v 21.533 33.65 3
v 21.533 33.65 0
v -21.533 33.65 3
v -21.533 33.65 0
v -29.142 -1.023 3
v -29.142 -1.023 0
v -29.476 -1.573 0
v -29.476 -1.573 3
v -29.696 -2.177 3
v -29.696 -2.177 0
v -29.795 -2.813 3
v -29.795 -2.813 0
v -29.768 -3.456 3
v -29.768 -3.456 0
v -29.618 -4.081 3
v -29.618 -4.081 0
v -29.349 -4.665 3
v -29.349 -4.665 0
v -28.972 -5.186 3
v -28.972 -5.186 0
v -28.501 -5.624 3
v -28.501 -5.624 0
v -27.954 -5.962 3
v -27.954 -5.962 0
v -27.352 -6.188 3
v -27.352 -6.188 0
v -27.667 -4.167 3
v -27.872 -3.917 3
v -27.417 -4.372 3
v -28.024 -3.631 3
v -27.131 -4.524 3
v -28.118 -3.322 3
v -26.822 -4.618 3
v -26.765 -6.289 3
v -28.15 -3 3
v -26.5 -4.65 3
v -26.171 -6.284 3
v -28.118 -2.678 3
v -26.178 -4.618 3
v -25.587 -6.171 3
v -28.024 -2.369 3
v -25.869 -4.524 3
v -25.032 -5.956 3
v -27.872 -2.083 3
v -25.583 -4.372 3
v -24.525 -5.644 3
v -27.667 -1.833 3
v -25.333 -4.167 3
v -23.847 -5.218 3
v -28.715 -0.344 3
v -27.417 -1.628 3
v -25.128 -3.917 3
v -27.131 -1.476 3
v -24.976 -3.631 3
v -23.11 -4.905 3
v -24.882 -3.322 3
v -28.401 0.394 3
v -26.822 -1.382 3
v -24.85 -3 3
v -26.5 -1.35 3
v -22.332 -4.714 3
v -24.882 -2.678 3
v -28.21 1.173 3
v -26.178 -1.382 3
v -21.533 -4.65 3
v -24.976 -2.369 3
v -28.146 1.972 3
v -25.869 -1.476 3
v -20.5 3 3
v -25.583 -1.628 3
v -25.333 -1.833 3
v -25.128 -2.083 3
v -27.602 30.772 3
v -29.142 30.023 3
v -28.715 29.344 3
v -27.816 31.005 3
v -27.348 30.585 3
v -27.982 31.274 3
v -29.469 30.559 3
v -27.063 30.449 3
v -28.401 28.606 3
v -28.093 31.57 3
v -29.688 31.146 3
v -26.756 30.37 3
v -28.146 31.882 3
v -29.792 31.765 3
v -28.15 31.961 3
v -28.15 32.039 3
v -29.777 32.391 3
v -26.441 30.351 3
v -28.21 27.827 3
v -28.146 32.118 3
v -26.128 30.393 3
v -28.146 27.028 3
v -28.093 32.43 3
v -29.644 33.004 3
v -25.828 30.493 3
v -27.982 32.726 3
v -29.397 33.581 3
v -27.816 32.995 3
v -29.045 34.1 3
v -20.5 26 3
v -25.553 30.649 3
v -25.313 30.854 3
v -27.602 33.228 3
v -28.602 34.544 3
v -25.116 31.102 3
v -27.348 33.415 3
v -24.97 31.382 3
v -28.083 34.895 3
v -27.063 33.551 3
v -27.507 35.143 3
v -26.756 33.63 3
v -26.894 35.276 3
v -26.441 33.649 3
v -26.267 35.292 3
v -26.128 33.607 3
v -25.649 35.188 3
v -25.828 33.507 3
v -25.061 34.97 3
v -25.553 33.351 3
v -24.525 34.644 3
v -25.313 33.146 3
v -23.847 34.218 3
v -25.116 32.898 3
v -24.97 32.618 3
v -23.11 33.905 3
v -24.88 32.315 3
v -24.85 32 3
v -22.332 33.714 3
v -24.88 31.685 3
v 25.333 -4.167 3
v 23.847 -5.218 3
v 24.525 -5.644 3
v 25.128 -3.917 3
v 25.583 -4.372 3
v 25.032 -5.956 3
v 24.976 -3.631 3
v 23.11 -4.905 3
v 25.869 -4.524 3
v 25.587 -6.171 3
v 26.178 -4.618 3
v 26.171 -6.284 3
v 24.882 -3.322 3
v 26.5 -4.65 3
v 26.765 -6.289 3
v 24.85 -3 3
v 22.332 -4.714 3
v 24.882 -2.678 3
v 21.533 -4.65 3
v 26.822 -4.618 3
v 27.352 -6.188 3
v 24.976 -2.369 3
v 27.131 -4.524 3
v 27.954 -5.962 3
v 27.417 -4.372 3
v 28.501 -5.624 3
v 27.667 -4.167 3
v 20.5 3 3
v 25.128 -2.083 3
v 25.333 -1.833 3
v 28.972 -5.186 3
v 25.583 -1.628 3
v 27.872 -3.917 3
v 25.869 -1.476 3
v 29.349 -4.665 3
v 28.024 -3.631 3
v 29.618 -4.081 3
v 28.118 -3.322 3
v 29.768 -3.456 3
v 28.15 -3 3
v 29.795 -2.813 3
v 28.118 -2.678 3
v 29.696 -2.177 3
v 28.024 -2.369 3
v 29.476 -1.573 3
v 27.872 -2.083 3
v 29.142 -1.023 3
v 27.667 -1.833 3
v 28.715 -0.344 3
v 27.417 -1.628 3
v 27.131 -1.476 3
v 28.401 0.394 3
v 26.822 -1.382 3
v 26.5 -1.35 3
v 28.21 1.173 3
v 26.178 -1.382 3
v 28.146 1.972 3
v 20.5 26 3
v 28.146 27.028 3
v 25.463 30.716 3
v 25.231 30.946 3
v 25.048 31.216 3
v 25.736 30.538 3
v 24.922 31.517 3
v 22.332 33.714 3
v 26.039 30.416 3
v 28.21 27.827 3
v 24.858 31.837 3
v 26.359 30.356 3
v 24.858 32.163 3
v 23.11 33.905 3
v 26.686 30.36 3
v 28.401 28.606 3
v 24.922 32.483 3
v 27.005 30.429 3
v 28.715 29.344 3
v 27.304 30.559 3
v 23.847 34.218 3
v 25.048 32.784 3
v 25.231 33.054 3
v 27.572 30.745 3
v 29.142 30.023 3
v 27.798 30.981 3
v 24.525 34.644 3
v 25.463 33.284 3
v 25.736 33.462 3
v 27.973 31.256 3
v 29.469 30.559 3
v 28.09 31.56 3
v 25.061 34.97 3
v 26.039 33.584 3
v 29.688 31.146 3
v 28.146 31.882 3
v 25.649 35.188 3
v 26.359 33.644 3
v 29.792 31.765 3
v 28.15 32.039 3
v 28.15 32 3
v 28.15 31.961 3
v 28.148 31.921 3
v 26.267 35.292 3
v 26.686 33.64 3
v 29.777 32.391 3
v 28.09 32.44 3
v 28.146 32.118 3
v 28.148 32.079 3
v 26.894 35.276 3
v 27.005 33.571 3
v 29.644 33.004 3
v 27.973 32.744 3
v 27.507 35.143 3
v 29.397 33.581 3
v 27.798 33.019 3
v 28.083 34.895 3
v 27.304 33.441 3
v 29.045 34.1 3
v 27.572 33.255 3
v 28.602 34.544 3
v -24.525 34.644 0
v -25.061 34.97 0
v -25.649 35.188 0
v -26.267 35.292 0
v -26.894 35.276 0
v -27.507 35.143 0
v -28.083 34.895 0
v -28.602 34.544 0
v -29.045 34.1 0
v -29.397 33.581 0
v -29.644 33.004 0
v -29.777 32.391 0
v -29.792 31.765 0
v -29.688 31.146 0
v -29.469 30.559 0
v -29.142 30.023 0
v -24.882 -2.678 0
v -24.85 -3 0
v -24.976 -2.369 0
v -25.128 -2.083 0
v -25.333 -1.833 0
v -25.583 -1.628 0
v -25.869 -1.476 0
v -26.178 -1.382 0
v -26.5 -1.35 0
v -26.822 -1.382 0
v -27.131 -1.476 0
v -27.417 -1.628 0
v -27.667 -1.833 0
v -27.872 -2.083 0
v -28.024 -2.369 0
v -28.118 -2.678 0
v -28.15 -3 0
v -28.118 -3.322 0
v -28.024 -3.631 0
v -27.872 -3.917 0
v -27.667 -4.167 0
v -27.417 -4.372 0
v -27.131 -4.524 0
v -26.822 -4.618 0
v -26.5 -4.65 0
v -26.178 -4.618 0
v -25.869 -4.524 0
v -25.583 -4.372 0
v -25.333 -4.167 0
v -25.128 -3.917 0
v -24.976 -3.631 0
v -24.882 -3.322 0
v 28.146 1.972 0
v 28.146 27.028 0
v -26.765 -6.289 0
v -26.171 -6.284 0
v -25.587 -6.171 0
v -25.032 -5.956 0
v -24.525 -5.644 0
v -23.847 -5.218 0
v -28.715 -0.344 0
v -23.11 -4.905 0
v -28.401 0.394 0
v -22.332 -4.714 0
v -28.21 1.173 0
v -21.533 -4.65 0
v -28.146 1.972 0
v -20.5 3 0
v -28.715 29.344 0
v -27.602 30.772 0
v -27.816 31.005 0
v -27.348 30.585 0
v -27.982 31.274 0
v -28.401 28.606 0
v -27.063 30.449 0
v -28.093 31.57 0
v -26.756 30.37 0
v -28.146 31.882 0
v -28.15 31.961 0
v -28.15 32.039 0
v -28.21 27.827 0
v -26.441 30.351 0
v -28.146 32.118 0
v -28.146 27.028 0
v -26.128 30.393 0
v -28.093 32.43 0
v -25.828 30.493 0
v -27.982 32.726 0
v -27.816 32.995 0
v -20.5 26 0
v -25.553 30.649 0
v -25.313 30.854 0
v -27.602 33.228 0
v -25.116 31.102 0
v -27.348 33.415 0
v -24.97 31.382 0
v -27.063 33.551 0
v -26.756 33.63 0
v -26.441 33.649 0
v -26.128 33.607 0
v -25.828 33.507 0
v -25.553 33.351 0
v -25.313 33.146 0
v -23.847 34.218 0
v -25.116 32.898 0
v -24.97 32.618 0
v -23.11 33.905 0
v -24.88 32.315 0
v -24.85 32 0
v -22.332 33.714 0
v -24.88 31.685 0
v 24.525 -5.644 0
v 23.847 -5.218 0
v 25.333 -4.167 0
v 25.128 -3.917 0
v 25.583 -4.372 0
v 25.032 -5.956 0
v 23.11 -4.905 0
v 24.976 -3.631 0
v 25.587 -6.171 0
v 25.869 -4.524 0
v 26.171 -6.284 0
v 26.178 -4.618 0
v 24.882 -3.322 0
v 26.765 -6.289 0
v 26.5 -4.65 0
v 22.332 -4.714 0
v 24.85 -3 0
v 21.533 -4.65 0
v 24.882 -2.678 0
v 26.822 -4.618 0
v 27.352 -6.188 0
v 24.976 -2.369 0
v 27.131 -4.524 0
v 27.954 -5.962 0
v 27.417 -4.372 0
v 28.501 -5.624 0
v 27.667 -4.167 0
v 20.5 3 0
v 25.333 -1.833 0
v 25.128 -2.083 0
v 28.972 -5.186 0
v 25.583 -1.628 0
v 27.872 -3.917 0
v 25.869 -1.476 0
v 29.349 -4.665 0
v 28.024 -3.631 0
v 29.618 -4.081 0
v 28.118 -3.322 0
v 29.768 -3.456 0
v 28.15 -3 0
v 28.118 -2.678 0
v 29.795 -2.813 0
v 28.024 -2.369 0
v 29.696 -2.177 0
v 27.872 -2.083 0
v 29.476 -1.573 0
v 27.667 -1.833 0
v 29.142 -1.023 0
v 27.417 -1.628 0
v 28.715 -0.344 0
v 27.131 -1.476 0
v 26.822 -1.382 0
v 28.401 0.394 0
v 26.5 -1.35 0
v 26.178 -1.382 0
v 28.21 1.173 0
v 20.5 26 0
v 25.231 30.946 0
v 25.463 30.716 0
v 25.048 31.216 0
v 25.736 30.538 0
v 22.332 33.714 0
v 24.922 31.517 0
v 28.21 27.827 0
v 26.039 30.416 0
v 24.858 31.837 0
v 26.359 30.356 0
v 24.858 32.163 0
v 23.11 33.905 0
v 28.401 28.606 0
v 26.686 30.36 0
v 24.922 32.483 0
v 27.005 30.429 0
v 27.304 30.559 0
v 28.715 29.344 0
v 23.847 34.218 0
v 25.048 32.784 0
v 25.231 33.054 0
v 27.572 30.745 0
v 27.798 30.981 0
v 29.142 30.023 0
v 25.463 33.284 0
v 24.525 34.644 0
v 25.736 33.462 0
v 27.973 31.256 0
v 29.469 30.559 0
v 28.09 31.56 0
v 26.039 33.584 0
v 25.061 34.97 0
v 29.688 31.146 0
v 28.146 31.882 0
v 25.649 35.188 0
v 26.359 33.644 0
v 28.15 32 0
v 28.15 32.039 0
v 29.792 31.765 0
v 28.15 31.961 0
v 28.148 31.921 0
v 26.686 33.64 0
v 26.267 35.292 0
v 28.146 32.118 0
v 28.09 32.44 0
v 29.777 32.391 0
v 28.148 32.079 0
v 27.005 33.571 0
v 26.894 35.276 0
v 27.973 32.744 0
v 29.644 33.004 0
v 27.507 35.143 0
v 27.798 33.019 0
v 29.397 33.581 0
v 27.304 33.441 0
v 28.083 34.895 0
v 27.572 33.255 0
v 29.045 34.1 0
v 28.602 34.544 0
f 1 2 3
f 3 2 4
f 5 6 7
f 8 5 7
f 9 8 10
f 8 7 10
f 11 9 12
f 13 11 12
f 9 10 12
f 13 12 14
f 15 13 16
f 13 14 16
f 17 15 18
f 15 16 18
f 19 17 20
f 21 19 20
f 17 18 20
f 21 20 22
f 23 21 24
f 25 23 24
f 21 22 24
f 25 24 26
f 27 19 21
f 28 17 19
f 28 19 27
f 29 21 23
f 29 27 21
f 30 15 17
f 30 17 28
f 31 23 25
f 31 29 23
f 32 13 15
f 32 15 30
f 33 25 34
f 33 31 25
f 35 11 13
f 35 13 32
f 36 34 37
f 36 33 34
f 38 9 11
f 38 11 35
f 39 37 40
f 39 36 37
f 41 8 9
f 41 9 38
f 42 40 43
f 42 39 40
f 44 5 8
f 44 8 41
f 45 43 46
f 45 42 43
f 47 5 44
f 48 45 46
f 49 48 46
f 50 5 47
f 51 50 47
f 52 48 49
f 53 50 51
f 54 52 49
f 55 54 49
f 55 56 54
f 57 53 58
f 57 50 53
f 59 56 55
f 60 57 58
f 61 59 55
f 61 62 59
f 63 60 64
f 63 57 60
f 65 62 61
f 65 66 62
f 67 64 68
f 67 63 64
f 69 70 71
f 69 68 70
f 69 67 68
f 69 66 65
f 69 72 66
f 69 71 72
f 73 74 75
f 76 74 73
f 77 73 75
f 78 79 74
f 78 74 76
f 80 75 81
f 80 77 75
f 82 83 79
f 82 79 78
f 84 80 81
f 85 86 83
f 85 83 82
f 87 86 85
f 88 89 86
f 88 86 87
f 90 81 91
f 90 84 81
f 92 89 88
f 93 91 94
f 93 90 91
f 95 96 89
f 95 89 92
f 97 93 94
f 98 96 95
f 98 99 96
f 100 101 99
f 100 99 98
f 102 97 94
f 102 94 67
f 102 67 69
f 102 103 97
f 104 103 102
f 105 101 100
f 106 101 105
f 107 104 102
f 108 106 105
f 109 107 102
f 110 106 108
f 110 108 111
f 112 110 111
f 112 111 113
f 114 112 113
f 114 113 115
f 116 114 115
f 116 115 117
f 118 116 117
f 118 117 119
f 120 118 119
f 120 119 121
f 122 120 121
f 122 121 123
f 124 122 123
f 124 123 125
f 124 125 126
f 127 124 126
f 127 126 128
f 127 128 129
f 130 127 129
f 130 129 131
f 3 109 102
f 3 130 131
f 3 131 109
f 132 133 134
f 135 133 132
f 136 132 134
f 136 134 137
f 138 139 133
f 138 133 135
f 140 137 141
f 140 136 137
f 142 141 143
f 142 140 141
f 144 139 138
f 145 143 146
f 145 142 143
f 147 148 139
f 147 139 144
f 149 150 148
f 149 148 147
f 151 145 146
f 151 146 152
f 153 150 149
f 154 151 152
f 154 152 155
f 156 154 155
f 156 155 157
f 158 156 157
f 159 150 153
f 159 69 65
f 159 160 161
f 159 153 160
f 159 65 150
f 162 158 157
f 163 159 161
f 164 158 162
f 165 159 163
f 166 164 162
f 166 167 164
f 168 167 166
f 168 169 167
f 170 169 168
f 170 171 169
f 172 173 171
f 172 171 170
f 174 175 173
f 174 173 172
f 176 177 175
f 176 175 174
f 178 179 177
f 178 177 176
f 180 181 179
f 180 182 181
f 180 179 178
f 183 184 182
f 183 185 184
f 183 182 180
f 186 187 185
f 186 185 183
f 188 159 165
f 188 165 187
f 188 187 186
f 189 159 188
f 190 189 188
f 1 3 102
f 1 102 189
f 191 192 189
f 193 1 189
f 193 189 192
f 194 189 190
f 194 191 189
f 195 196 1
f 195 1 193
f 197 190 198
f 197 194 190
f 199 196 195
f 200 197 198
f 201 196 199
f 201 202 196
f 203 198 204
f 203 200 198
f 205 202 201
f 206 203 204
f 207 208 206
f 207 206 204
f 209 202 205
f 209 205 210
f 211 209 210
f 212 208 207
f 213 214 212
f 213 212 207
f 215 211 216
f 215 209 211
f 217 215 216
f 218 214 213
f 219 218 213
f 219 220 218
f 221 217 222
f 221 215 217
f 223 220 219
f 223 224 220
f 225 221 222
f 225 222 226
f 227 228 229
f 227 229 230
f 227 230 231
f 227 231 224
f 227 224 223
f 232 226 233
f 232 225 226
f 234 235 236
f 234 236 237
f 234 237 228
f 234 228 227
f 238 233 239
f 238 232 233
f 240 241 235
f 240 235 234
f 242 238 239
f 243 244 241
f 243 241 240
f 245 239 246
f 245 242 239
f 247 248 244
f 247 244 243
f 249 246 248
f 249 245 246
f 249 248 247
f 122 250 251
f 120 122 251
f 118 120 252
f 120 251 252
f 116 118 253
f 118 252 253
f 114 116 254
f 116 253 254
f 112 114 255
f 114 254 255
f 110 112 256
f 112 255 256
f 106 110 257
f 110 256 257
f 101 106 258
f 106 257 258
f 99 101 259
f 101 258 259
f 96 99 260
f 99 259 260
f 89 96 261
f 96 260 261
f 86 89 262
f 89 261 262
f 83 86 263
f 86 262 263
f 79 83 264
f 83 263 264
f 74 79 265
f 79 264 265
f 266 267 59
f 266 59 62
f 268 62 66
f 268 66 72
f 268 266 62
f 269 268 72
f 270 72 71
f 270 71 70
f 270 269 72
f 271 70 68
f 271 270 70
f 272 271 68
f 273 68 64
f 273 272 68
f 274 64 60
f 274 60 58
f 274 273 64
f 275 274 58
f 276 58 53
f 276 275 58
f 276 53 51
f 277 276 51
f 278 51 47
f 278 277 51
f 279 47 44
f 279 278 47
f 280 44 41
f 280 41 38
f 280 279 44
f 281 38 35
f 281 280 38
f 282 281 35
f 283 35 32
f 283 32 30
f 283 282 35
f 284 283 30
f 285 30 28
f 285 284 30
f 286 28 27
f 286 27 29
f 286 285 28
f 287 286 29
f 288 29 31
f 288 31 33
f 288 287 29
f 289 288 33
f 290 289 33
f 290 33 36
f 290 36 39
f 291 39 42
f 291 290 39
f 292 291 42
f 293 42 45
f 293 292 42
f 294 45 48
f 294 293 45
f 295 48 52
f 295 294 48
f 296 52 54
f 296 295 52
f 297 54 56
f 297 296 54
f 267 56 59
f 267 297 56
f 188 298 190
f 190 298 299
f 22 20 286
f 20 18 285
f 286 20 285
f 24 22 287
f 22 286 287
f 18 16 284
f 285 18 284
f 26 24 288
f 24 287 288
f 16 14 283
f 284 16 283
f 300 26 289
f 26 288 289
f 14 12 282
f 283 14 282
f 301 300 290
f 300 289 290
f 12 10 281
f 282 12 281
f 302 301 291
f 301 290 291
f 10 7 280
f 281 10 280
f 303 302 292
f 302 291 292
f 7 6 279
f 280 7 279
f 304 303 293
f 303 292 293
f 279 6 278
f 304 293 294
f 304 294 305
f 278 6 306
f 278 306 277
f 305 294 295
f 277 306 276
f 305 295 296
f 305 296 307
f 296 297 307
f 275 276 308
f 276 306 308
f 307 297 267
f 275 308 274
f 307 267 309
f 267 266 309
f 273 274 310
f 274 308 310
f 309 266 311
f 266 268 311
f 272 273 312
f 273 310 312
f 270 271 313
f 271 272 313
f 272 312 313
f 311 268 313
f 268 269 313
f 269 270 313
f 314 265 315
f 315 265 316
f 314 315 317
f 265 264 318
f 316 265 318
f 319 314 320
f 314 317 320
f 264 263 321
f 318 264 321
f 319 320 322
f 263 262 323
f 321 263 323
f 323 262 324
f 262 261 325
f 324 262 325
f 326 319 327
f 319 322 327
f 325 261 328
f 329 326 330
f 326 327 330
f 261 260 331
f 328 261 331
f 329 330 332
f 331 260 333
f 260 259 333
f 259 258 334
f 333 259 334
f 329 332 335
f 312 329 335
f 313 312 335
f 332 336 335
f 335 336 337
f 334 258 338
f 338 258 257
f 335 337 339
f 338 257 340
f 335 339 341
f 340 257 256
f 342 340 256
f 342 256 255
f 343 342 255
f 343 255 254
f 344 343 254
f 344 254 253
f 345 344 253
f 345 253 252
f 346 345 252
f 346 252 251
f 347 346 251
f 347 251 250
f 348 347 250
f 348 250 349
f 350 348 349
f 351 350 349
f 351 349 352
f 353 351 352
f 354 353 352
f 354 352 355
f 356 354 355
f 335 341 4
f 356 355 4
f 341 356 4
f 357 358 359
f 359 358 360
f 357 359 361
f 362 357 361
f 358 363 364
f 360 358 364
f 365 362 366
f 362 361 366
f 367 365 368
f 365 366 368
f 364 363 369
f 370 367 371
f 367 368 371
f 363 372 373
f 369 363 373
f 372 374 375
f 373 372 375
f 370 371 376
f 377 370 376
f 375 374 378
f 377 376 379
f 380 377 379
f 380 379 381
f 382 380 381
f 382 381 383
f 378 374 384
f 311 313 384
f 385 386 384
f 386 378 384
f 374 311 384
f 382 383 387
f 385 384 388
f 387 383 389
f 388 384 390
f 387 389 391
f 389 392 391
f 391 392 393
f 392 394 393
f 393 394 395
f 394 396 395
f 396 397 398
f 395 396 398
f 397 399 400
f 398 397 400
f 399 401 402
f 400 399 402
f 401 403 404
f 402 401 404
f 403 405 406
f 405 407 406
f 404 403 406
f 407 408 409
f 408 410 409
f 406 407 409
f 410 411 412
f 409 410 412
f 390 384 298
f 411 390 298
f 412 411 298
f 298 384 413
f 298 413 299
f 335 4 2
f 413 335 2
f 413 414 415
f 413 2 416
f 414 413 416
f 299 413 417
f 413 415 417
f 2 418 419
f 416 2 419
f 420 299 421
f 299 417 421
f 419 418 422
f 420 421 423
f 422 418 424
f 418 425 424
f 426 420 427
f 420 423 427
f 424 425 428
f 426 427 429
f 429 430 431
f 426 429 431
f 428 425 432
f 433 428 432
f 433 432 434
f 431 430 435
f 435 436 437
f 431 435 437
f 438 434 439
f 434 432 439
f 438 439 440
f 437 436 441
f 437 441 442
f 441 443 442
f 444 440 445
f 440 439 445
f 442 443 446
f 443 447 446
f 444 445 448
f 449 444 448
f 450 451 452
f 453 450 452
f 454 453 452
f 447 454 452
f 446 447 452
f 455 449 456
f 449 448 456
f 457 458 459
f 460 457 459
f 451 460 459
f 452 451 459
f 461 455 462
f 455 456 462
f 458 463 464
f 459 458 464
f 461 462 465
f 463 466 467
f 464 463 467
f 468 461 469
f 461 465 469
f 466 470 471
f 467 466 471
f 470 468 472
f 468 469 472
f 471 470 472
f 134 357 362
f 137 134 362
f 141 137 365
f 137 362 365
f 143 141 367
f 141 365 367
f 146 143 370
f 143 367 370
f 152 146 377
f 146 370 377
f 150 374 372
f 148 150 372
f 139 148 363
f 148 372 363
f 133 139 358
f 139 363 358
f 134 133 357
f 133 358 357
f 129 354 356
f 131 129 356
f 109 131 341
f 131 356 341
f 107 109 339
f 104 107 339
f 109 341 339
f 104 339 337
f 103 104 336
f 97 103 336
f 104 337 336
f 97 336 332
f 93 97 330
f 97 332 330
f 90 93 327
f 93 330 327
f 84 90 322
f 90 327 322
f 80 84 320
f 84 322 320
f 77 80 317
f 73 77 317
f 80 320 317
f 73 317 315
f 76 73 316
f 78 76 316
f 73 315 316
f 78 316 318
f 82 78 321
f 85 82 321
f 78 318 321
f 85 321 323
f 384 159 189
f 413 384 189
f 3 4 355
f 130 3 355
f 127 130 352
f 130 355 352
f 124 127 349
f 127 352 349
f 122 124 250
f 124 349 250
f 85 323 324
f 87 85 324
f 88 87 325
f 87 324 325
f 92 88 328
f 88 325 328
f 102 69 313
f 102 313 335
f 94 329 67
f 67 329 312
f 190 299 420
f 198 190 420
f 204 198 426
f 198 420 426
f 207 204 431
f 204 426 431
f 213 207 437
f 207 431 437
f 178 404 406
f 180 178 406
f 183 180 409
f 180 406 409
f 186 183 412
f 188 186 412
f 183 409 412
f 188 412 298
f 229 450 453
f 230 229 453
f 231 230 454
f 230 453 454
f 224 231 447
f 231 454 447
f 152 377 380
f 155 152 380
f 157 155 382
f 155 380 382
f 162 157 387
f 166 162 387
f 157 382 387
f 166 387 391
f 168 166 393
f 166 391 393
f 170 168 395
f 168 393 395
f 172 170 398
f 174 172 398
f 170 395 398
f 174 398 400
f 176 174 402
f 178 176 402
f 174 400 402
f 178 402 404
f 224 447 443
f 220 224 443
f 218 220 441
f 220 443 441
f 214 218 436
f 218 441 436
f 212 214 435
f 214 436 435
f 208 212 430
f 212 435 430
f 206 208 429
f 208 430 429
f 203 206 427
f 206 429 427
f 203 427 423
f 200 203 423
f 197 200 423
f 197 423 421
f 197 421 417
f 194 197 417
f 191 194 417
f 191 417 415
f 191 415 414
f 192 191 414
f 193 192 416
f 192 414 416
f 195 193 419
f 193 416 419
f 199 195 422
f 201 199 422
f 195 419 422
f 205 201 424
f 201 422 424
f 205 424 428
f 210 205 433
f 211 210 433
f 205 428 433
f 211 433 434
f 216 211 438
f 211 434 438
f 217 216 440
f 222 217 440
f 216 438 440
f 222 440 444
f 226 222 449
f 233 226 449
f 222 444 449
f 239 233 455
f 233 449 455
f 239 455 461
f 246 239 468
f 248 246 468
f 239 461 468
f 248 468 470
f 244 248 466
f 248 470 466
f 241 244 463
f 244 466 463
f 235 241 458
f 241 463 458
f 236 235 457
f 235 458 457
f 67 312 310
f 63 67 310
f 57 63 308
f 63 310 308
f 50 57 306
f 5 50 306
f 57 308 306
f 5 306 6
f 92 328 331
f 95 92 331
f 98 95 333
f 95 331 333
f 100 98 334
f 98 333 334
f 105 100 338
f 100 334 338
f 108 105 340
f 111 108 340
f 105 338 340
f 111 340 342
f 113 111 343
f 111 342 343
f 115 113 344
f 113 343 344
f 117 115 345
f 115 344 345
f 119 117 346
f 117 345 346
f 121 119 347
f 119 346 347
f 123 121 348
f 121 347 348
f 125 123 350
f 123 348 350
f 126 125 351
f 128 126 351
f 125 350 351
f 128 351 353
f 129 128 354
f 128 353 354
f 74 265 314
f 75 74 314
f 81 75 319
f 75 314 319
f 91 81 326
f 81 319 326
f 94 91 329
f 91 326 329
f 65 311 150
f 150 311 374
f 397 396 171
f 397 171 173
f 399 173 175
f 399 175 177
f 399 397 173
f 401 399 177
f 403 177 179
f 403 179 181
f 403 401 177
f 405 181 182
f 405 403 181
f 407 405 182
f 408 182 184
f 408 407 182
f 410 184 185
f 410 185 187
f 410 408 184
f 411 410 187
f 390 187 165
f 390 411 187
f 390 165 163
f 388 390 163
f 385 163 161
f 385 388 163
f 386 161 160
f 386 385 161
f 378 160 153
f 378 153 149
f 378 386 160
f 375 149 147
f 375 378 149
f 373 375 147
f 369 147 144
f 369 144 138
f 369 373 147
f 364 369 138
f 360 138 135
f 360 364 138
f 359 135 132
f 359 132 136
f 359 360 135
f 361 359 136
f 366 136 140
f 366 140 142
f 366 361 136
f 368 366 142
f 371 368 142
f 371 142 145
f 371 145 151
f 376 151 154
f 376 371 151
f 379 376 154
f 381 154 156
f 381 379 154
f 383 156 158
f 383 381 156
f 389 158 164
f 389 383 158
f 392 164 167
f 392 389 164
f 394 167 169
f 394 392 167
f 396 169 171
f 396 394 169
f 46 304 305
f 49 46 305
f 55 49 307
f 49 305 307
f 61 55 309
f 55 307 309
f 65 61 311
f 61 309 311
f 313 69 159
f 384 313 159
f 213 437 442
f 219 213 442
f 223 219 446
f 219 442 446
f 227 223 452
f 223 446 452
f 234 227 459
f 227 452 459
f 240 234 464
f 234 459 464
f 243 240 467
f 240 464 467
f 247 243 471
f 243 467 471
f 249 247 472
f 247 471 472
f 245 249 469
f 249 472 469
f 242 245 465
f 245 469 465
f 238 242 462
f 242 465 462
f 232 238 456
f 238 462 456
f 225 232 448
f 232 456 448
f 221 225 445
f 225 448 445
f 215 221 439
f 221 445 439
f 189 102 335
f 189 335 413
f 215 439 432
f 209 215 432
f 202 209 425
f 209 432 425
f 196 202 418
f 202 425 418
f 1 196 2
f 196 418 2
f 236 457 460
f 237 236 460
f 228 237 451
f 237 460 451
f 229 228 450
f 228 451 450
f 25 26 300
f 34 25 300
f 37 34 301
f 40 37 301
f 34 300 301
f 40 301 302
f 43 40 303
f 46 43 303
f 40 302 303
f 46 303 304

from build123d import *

# Parameters (mm, degrees)
F0_W     = 47
F0_H     = 29
F1_DEPTH = 3
F0_R     = 1.65
F2_DEPTH = 3
F3_W     = 41
F3_H     = 23
F4_DEPTH = 3.001


with BuildPart() as f1:
    # F0 (on Top) → F1 (new body)
    with BuildSketch(Plane.XY):
        with Locations((0, 14.5)):
            Rectangle(F0_W, F0_H)
    extrude(amount=F1_DEPTH)

    # F0 (on Top) → F2 (join)
    with BuildSketch(Plane.XY):
        with BuildLine():
            ThreePointArc((-21.533361, 33.65), (-23.10973, 33.904996), (-24.525312, 34.643976))
            ThreePointArc((-24.525312, 34.643976), (-28.834444, 34.33246), (-29.142296, 30.023065))
            ThreePointArc((-29.142296, 30.023065), (-28.401441, 28.606095), (-28.145774, 27.027708))
            Line((-28.145774, 27.027708), (-28.145774, 1.972292))
            ThreePointArc((-28.145774, 1.972292), (-28.401441, 0.393905), (-29.142296, -1.023065))
            ThreePointArc((-29.142296, -1.023065), (-29.617954, -4.080909), (-27.351685, -6.188202))
            ThreePointArc((-27.351685, -6.188202), (-25.876037, -6.240474), (-24.525312, -5.643976))
            ThreePointArc((-24.525312, -5.643976), (-23.10973, -4.904996), (-21.533361, -4.65))
            Line((-21.533361, -4.65), (21.533361, -4.65))
            ThreePointArc((21.533361, -4.65), (23.10973, -4.904996), (24.525312, -5.643976))
            ThreePointArc((24.525312, -5.643976), (25.876037, -6.240474), (27.351685, -6.188202))
            ThreePointArc((27.351685, -6.188202), (29.617954, -4.080909), (29.142296, -1.023065))
            ThreePointArc((29.142296, -1.023065), (28.401441, 0.393905), (28.145774, 1.972292))
            Line((28.145774, 1.972292), (28.145774, 27.027708))
            ThreePointArc((28.145774, 27.027708), (28.401441, 28.606095), (29.142296, 30.023065))
            ThreePointArc((29.142296, 30.023065), (28.834444, 34.33246), (24.525312, 34.643976))
            ThreePointArc((24.525312, 34.643976), (23.10973, 33.904996), (21.533361, 33.65))
            Line((21.533361, 33.65), (-21.533361, 33.65))
        make_face()
        with Locations((-26.5, -3)):
            Circle(F0_R, mode=Mode.SUBTRACT)
        with Locations((26.5, -3)):
            Circle(F0_R, mode=Mode.SUBTRACT)
        with BuildLine():
            ThreePointArc((-28.145774, 32.118016), (-26.440954, 33.648943), (-24.85, 32))
            ThreePointArc((-24.85, 32), (-26.440954, 30.351057), (-28.145774, 31.881984))
            ThreePointArc((-28.145774, 31.881984), (-28.15, 32), (-28.145774, 32.118016))
        make_face(mode=Mode.SUBTRACT)
        with Locations((0, 14.5)):
            Rectangle(F0_W, F0_H, mode=Mode.SUBTRACT)
        with BuildLine():
            ThreePointArc((28.145774, 32.118016), (28.148943, 32.059046), (28.15, 32))
            ThreePointArc((28.15, 32), (28.148943, 31.940954), (28.145774, 31.881984))
            ThreePointArc((28.145774, 31.881984), (24.85, 32), (28.145774, 32.118016))
        make_face(mode=Mode.SUBTRACT)
    extrude(amount=F2_DEPTH)

    # F3 (on face) → F4 (cut, through all)
    with BuildSketch(Plane.XY.offset(3)):
        with Locations((0, 14.5)):
            Rectangle(F3_W, F3_H)
    extrude(amount=-F4_DEPTH, mode=Mode.SUBTRACT)


solid = f1.part
